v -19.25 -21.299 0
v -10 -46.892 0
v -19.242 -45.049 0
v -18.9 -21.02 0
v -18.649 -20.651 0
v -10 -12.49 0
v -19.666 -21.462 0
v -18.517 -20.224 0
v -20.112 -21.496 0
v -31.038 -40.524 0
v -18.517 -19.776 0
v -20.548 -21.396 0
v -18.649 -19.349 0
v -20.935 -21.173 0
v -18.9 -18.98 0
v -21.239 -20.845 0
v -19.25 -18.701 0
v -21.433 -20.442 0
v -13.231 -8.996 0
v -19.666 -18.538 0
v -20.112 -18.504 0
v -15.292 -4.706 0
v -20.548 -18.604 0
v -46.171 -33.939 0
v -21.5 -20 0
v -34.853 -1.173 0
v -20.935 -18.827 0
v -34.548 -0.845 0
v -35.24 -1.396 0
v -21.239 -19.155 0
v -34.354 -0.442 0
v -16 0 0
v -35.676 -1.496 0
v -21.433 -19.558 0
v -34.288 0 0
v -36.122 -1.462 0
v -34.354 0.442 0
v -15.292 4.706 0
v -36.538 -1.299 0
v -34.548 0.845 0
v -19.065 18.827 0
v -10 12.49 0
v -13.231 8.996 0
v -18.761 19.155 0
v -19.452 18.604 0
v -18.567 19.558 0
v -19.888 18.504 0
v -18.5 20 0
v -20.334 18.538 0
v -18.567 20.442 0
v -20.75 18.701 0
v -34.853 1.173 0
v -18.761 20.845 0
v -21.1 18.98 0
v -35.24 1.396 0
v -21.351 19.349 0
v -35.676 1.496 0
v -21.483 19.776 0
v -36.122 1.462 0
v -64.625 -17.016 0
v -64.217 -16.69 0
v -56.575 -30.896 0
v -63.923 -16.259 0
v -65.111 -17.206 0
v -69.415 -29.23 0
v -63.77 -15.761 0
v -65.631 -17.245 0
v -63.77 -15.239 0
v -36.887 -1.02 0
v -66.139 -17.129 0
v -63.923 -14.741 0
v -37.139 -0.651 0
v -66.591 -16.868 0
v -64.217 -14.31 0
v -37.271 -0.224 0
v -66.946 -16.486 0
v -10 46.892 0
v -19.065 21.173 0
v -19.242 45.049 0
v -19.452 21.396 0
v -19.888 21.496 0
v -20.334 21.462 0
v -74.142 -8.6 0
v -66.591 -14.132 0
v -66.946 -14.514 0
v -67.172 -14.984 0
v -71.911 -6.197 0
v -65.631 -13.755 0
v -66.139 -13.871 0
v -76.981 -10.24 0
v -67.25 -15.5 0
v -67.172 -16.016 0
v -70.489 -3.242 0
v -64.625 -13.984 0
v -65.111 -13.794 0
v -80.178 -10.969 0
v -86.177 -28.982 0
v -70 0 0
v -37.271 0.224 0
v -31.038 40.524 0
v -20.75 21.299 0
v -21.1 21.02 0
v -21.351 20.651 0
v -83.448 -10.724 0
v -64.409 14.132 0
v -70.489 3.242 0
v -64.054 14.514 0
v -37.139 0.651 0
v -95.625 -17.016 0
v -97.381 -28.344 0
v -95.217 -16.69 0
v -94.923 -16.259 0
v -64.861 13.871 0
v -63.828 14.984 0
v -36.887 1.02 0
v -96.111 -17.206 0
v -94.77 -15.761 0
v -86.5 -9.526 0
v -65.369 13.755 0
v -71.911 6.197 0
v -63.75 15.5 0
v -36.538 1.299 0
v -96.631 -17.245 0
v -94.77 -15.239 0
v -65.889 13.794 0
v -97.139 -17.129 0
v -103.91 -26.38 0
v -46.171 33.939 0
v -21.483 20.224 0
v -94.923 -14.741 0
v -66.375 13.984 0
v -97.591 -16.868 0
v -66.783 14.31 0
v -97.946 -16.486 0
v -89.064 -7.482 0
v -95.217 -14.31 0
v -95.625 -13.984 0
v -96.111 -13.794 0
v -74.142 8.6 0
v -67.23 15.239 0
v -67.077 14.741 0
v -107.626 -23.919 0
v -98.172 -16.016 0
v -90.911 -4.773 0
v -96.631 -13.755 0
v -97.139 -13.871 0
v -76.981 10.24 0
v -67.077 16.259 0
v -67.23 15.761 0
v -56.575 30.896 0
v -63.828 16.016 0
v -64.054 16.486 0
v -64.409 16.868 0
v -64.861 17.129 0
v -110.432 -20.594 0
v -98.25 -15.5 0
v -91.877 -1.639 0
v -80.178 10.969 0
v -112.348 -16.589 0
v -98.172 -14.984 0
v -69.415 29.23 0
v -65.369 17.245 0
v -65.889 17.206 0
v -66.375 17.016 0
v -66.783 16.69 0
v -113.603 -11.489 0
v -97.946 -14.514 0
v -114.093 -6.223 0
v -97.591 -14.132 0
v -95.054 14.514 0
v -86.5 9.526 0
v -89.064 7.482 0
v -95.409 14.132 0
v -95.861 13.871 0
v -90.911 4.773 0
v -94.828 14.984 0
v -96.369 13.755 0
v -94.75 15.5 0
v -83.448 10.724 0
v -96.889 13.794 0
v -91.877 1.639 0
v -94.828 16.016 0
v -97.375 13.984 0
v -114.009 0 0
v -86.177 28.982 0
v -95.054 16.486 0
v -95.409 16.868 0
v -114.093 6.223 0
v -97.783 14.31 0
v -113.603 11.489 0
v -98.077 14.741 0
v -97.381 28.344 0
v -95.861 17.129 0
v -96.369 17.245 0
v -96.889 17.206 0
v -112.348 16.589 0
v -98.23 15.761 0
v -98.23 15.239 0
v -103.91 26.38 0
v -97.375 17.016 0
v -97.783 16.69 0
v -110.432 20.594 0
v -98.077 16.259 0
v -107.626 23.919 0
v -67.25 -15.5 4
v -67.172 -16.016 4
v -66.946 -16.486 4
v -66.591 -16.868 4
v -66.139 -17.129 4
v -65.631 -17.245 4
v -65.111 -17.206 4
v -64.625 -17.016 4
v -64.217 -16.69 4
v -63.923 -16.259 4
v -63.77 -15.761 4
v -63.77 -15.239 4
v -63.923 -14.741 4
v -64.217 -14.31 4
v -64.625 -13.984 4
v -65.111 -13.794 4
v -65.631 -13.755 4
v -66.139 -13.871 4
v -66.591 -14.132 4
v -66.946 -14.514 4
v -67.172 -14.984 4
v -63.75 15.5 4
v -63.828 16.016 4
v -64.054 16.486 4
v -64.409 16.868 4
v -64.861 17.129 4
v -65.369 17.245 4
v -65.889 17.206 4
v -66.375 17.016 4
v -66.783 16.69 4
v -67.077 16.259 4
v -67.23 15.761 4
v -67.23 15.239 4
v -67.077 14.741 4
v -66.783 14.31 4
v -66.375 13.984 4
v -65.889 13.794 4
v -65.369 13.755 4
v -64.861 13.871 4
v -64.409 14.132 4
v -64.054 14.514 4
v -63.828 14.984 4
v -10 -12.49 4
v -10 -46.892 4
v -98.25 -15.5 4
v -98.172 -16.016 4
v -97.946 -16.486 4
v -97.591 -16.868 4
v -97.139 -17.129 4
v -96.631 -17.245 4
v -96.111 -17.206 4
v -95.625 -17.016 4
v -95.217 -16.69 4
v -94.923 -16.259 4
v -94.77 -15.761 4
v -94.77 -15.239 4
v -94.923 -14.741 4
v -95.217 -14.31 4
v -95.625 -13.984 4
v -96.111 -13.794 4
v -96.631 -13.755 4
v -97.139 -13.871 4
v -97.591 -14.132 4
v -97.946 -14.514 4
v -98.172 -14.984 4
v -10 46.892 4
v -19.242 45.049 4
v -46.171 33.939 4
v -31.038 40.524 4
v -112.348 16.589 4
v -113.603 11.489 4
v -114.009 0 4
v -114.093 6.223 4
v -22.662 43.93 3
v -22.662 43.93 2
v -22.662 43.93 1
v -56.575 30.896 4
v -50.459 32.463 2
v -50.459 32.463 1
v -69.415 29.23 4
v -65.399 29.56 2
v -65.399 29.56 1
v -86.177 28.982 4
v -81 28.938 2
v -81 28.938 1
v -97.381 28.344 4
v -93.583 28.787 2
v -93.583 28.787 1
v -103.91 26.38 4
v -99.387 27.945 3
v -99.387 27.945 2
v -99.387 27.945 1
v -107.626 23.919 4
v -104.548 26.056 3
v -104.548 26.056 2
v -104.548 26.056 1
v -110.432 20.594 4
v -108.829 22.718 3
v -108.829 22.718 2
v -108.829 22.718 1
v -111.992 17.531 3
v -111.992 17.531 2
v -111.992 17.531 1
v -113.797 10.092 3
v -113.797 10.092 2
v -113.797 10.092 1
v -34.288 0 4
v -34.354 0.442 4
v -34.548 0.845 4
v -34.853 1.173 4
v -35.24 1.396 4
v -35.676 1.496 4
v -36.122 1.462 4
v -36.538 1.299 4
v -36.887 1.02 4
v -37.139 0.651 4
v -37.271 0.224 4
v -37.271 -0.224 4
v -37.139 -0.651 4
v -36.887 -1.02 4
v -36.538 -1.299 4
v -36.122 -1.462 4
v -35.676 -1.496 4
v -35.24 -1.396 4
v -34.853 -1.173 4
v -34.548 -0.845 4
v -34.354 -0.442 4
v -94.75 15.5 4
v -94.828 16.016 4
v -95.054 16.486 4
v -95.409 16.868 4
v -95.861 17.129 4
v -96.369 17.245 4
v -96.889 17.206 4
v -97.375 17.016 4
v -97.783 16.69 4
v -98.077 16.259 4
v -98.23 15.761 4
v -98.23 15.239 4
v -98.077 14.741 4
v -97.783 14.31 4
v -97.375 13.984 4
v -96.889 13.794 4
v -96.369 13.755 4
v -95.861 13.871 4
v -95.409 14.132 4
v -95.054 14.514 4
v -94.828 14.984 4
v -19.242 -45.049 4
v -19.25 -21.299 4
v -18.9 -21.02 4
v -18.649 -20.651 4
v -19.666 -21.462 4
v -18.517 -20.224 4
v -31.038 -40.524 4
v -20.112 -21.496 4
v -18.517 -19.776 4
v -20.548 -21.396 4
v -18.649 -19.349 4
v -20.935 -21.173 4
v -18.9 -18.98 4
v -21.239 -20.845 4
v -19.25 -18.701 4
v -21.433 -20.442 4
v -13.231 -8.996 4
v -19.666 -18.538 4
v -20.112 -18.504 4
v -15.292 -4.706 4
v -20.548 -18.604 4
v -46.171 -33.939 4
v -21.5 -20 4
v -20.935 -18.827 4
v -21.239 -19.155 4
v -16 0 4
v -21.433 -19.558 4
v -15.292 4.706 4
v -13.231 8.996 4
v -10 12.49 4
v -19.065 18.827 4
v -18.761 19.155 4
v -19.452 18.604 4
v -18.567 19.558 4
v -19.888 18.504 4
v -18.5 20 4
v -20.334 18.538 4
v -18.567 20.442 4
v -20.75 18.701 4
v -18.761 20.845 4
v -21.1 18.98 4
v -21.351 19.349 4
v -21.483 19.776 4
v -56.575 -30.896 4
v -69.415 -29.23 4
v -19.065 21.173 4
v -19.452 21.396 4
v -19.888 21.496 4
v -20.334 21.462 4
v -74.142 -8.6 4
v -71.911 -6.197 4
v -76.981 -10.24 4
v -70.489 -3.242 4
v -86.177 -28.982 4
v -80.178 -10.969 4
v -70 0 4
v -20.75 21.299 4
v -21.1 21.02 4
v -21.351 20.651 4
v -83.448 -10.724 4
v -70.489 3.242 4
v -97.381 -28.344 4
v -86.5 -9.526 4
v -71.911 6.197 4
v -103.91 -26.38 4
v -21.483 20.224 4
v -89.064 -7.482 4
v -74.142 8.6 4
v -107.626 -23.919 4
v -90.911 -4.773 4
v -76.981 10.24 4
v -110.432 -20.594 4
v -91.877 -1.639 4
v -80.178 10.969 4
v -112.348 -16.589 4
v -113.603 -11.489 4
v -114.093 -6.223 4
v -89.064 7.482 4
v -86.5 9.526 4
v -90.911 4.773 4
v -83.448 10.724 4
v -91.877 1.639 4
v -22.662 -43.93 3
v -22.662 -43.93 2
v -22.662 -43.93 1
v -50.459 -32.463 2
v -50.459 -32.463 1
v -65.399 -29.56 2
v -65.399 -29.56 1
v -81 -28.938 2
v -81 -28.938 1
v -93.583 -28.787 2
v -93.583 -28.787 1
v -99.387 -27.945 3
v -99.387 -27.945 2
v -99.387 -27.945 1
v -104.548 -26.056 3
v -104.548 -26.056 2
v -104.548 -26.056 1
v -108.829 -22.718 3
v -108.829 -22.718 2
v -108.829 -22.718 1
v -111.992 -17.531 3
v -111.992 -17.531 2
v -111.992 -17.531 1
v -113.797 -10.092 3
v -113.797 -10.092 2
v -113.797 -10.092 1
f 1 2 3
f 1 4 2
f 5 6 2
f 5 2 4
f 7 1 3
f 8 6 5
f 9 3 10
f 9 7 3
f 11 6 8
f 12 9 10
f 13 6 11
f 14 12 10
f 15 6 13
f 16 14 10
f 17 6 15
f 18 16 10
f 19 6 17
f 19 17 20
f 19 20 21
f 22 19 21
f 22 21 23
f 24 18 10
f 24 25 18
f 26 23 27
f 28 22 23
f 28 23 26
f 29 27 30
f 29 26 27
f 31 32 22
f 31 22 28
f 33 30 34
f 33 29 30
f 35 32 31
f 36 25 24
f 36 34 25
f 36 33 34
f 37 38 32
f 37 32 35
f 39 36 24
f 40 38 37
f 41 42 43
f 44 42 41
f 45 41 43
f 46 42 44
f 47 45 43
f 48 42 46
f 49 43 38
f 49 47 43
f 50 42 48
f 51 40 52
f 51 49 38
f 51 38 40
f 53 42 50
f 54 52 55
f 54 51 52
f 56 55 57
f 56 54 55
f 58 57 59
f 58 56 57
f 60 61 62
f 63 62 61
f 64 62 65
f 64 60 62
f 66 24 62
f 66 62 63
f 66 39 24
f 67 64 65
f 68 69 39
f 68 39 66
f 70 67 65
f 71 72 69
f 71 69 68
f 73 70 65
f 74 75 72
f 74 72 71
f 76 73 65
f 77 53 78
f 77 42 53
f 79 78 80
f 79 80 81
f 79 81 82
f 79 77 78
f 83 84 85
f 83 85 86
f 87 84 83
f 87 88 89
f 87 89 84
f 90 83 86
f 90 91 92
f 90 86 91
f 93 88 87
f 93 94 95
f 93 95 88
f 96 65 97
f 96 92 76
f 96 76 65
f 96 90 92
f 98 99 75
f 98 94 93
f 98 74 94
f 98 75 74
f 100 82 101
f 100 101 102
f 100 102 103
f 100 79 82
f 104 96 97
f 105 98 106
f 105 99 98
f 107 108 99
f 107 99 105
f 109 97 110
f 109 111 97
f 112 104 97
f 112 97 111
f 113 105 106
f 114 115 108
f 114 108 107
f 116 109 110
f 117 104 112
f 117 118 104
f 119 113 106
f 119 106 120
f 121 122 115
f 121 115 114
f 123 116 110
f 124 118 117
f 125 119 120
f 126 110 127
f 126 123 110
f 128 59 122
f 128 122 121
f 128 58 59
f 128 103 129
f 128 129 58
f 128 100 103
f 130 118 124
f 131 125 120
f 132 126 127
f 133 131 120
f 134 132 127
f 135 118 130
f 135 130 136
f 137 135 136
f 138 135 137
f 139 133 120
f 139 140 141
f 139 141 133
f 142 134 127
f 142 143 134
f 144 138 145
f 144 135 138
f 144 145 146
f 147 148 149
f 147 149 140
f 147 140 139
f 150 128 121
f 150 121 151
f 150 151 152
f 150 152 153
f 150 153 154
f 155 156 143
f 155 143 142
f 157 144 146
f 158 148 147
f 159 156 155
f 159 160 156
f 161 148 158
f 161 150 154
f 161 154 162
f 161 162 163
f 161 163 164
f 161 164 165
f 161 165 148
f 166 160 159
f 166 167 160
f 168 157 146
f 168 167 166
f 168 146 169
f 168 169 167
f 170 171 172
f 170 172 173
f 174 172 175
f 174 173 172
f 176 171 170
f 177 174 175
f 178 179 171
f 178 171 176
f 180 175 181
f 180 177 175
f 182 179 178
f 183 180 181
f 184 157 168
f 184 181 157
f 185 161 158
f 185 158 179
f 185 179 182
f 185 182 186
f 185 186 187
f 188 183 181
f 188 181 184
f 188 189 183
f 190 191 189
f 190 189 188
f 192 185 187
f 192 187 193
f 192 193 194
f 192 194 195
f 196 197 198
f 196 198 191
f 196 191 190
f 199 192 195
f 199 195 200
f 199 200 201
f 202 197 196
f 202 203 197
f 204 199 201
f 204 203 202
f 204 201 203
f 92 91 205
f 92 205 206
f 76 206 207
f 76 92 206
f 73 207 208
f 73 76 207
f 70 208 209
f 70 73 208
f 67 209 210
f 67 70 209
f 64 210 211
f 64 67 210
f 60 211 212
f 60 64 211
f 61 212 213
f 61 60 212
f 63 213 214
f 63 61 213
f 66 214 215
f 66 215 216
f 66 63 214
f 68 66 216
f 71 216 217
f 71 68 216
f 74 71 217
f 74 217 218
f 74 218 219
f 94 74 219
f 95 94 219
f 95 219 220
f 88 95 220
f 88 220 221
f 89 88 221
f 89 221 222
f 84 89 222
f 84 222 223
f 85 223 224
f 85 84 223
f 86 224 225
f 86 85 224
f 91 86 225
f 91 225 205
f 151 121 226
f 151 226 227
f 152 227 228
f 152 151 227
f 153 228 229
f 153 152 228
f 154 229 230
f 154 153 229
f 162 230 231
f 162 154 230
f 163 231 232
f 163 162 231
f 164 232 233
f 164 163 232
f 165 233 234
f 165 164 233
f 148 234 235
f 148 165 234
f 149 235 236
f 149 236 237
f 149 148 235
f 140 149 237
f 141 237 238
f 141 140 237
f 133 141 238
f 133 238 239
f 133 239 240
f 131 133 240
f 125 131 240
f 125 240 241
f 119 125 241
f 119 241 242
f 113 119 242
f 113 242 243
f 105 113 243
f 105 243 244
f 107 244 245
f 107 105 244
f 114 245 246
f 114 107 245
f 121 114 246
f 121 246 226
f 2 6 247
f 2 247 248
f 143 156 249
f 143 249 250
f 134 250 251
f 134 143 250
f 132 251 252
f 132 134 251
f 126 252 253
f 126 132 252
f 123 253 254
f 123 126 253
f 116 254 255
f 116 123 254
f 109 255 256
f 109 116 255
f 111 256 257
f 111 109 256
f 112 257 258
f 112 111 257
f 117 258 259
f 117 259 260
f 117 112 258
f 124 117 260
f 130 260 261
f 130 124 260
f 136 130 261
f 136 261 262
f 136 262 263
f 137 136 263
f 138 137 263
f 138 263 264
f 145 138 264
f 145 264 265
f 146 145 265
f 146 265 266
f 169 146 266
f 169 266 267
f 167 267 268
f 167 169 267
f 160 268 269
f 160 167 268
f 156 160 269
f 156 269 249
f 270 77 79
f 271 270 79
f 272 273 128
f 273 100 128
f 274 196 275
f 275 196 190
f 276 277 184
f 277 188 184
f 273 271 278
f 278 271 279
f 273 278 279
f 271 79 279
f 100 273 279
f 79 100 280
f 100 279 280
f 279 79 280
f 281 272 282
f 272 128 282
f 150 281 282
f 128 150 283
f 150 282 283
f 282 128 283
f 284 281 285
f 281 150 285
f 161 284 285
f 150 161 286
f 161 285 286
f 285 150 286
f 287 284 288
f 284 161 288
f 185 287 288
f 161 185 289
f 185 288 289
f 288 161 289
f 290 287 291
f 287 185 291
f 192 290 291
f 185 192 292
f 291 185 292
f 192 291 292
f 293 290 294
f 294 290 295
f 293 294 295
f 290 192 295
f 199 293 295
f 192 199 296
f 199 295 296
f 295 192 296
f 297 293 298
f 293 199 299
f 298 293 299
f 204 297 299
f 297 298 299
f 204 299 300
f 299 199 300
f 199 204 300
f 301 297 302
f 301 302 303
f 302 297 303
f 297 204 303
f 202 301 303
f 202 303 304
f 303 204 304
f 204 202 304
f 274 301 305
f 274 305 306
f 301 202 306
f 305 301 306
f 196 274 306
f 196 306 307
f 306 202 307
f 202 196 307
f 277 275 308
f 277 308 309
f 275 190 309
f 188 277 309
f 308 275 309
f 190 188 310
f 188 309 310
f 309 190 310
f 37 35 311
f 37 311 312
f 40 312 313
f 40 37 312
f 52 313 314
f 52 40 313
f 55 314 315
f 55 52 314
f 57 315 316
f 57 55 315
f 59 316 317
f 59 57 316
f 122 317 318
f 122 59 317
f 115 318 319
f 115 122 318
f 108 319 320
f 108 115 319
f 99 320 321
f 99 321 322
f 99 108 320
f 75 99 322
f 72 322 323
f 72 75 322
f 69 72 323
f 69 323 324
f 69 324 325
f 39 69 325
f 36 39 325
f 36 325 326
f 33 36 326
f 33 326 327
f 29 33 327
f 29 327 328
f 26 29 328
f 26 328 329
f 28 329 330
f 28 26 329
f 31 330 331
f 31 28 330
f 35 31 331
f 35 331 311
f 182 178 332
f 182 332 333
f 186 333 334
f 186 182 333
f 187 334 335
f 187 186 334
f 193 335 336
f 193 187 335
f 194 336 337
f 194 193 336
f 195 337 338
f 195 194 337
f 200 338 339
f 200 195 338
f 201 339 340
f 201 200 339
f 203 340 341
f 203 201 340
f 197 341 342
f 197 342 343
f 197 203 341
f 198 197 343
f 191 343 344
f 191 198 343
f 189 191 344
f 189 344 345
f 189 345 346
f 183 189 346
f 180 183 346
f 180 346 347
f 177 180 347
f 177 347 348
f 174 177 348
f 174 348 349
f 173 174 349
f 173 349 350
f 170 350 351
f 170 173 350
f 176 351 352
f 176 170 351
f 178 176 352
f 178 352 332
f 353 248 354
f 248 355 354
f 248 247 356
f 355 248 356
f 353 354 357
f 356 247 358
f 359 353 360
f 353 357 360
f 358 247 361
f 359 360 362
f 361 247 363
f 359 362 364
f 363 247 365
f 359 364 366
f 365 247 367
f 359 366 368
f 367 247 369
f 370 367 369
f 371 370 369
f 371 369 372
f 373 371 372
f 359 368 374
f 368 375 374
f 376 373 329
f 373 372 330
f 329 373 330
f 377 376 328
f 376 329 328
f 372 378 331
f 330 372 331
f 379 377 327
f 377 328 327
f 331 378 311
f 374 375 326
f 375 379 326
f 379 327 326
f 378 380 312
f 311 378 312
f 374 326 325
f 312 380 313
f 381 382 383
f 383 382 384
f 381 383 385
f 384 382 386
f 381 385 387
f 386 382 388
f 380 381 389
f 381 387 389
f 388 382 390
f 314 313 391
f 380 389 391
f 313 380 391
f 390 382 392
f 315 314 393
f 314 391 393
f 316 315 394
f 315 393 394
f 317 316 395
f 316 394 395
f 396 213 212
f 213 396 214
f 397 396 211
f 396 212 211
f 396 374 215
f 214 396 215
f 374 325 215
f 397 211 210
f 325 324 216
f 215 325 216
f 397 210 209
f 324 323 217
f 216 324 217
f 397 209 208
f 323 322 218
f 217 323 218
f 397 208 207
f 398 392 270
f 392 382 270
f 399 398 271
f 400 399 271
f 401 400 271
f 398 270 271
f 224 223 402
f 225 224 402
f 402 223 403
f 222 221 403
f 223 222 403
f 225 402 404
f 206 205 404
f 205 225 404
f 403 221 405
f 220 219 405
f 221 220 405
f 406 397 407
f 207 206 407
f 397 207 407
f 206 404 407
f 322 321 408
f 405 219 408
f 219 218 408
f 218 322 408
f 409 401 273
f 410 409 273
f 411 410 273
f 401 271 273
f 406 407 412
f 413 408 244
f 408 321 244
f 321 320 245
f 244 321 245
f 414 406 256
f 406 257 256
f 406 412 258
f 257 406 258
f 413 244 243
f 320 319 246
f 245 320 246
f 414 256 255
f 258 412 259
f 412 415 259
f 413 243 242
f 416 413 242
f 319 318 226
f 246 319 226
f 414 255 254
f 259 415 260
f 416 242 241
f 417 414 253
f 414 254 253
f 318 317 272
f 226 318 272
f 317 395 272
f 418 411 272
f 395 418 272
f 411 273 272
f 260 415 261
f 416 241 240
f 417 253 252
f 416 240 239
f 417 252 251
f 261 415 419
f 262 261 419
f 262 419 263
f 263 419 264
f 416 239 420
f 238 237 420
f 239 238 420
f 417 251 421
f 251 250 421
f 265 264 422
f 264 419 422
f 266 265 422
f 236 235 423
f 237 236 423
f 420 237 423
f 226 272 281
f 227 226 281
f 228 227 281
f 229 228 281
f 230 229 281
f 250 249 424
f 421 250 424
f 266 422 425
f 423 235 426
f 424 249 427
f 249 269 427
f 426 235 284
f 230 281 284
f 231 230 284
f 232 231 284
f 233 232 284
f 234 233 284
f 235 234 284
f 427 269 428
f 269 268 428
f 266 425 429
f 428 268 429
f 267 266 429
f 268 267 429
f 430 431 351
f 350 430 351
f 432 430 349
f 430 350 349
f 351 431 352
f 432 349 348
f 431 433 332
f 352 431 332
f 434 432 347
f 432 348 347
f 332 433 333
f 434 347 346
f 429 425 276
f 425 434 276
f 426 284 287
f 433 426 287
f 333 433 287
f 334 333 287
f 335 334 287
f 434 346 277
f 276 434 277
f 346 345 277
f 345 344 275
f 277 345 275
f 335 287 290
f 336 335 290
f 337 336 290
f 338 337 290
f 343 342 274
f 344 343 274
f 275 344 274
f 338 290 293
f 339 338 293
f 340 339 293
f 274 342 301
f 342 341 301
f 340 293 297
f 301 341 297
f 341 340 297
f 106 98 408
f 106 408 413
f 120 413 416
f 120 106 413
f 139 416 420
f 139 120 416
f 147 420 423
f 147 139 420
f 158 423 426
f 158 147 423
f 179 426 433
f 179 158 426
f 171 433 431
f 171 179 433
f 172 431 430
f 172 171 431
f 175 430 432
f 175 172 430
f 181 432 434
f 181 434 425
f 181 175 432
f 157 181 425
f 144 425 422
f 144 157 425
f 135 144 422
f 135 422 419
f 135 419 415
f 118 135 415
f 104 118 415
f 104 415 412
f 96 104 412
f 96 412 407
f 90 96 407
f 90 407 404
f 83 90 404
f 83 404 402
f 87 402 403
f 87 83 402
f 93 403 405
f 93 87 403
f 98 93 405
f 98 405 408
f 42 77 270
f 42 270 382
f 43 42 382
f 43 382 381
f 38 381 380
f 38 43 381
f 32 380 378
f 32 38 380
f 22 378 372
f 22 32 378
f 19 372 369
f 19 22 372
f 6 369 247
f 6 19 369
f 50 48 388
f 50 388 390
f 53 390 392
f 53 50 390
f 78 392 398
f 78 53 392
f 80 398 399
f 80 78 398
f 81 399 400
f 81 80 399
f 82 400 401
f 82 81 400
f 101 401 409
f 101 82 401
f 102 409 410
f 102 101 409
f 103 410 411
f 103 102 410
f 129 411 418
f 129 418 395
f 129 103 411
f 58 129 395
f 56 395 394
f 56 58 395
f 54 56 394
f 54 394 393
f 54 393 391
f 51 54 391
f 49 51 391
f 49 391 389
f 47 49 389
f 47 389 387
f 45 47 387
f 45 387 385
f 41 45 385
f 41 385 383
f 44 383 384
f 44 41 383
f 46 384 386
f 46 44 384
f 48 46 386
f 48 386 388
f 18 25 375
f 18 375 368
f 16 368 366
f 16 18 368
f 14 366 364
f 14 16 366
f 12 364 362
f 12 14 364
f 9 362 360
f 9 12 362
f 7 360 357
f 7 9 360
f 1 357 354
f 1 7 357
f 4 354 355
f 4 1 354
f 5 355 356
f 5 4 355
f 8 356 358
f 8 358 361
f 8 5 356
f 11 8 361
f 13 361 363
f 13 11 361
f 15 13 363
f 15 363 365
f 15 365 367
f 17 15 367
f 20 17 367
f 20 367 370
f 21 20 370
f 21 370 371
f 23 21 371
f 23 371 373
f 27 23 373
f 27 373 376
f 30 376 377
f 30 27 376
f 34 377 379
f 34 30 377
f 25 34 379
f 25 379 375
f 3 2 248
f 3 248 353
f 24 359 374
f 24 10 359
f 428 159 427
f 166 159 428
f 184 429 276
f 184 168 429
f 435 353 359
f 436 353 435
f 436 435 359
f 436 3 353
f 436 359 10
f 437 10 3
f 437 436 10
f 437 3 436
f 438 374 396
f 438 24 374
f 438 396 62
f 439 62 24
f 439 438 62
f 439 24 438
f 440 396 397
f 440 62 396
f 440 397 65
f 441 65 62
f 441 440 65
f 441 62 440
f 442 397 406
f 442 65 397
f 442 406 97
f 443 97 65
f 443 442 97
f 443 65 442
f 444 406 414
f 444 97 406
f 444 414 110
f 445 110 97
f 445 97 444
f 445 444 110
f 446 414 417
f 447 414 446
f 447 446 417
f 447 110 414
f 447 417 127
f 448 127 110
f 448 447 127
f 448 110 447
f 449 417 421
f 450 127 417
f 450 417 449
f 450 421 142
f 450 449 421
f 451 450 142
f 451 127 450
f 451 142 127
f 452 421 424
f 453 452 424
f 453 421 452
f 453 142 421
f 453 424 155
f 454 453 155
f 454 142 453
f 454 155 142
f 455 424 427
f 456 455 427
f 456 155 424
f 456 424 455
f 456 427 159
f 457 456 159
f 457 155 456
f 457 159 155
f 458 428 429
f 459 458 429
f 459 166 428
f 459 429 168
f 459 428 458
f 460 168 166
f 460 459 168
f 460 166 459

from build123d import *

# Parameters (mm, degrees)
SKETCH1_R           = 1.75
SKETCH1_R_2         = 11
SKETCH1_R_3         = 1.5
BOSS_EXTRUDE1_DEPTH = 4


with BuildPart() as part:
    # Sketch1 → Boss-Extrude1 (new body)
    with BuildSketch(Plane.XY):
        with BuildLine():
            Line((-10, -12.489995997), (-10, -46.892440974))
            add(Edge.make_bspline(
                [(-10, -46.892440974), (-14.369218745, -46.490133027), (-28.167584564, -42.861139713), (-50.099896224, -30.060662438), (-86.961390459, -27.922716714), (-115.783330075, -30.807532602), (-114.008518426, 0)],
                knots=[0.072781672, 0.072781672, 0.072781672, 0.072781672, 0.171379313, 0.397323978, 0.628335943, 1, 1, 1, 1], degree=3))
            add(Edge.make_bspline(
                [(-10, 46.892440974), (-14.369218745, 46.490133027), (-28.167584564, 42.861139713), (-50.099896224, 30.060662438), (-86.961390459, 27.922716714), (-115.783330075, 30.807532602), (-114.008518426, 0)],
                knots=[0.072781672, 0.072781672, 0.072781672, 0.072781672, 0.171379313, 0.397323978, 0.628335943, 1, 1, 1, 1], degree=3))
            Line((-10, 46.892440974), (-10, 12.489995997))
            ThreePointArc((-10, 12.489995997), (-16, 0), (-10, -12.489995997))
        make_face()
        with Locations((-96.5, 15.5)):
            Circle(SKETCH1_R, mode=Mode.SUBTRACT)
        with Locations((-65.5, 15.5)):
            Circle(SKETCH1_R, mode=Mode.SUBTRACT)
        with Locations(Location((-65.5, -15.5, 0), (0, 0, 180))):
            Circle(SKETCH1_R, mode=Mode.SUBTRACT)
        with Locations(Location((-96.5, -15.5, 0), (0, 0, 180))):
            Circle(SKETCH1_R, mode=Mode.SUBTRACT)
        with Locations((-81, 0)):
            Circle(SKETCH1_R_2, mode=Mode.SUBTRACT)
        with Locations((-35.787805635, 0)):
            Circle(SKETCH1_R_3, mode=Mode.SUBTRACT)
        with Locations((-20, 20)):
            Circle(SKETCH1_R_3, mode=Mode.SUBTRACT)
        with Locations(Location((-20, -20, 0), (0, 0, 180))):
            Circle(SKETCH1_R_3, mode=Mode.SUBTRACT)
    extrude(amount=BOSS_EXTRUDE1_DEPTH)


solid = part.part
